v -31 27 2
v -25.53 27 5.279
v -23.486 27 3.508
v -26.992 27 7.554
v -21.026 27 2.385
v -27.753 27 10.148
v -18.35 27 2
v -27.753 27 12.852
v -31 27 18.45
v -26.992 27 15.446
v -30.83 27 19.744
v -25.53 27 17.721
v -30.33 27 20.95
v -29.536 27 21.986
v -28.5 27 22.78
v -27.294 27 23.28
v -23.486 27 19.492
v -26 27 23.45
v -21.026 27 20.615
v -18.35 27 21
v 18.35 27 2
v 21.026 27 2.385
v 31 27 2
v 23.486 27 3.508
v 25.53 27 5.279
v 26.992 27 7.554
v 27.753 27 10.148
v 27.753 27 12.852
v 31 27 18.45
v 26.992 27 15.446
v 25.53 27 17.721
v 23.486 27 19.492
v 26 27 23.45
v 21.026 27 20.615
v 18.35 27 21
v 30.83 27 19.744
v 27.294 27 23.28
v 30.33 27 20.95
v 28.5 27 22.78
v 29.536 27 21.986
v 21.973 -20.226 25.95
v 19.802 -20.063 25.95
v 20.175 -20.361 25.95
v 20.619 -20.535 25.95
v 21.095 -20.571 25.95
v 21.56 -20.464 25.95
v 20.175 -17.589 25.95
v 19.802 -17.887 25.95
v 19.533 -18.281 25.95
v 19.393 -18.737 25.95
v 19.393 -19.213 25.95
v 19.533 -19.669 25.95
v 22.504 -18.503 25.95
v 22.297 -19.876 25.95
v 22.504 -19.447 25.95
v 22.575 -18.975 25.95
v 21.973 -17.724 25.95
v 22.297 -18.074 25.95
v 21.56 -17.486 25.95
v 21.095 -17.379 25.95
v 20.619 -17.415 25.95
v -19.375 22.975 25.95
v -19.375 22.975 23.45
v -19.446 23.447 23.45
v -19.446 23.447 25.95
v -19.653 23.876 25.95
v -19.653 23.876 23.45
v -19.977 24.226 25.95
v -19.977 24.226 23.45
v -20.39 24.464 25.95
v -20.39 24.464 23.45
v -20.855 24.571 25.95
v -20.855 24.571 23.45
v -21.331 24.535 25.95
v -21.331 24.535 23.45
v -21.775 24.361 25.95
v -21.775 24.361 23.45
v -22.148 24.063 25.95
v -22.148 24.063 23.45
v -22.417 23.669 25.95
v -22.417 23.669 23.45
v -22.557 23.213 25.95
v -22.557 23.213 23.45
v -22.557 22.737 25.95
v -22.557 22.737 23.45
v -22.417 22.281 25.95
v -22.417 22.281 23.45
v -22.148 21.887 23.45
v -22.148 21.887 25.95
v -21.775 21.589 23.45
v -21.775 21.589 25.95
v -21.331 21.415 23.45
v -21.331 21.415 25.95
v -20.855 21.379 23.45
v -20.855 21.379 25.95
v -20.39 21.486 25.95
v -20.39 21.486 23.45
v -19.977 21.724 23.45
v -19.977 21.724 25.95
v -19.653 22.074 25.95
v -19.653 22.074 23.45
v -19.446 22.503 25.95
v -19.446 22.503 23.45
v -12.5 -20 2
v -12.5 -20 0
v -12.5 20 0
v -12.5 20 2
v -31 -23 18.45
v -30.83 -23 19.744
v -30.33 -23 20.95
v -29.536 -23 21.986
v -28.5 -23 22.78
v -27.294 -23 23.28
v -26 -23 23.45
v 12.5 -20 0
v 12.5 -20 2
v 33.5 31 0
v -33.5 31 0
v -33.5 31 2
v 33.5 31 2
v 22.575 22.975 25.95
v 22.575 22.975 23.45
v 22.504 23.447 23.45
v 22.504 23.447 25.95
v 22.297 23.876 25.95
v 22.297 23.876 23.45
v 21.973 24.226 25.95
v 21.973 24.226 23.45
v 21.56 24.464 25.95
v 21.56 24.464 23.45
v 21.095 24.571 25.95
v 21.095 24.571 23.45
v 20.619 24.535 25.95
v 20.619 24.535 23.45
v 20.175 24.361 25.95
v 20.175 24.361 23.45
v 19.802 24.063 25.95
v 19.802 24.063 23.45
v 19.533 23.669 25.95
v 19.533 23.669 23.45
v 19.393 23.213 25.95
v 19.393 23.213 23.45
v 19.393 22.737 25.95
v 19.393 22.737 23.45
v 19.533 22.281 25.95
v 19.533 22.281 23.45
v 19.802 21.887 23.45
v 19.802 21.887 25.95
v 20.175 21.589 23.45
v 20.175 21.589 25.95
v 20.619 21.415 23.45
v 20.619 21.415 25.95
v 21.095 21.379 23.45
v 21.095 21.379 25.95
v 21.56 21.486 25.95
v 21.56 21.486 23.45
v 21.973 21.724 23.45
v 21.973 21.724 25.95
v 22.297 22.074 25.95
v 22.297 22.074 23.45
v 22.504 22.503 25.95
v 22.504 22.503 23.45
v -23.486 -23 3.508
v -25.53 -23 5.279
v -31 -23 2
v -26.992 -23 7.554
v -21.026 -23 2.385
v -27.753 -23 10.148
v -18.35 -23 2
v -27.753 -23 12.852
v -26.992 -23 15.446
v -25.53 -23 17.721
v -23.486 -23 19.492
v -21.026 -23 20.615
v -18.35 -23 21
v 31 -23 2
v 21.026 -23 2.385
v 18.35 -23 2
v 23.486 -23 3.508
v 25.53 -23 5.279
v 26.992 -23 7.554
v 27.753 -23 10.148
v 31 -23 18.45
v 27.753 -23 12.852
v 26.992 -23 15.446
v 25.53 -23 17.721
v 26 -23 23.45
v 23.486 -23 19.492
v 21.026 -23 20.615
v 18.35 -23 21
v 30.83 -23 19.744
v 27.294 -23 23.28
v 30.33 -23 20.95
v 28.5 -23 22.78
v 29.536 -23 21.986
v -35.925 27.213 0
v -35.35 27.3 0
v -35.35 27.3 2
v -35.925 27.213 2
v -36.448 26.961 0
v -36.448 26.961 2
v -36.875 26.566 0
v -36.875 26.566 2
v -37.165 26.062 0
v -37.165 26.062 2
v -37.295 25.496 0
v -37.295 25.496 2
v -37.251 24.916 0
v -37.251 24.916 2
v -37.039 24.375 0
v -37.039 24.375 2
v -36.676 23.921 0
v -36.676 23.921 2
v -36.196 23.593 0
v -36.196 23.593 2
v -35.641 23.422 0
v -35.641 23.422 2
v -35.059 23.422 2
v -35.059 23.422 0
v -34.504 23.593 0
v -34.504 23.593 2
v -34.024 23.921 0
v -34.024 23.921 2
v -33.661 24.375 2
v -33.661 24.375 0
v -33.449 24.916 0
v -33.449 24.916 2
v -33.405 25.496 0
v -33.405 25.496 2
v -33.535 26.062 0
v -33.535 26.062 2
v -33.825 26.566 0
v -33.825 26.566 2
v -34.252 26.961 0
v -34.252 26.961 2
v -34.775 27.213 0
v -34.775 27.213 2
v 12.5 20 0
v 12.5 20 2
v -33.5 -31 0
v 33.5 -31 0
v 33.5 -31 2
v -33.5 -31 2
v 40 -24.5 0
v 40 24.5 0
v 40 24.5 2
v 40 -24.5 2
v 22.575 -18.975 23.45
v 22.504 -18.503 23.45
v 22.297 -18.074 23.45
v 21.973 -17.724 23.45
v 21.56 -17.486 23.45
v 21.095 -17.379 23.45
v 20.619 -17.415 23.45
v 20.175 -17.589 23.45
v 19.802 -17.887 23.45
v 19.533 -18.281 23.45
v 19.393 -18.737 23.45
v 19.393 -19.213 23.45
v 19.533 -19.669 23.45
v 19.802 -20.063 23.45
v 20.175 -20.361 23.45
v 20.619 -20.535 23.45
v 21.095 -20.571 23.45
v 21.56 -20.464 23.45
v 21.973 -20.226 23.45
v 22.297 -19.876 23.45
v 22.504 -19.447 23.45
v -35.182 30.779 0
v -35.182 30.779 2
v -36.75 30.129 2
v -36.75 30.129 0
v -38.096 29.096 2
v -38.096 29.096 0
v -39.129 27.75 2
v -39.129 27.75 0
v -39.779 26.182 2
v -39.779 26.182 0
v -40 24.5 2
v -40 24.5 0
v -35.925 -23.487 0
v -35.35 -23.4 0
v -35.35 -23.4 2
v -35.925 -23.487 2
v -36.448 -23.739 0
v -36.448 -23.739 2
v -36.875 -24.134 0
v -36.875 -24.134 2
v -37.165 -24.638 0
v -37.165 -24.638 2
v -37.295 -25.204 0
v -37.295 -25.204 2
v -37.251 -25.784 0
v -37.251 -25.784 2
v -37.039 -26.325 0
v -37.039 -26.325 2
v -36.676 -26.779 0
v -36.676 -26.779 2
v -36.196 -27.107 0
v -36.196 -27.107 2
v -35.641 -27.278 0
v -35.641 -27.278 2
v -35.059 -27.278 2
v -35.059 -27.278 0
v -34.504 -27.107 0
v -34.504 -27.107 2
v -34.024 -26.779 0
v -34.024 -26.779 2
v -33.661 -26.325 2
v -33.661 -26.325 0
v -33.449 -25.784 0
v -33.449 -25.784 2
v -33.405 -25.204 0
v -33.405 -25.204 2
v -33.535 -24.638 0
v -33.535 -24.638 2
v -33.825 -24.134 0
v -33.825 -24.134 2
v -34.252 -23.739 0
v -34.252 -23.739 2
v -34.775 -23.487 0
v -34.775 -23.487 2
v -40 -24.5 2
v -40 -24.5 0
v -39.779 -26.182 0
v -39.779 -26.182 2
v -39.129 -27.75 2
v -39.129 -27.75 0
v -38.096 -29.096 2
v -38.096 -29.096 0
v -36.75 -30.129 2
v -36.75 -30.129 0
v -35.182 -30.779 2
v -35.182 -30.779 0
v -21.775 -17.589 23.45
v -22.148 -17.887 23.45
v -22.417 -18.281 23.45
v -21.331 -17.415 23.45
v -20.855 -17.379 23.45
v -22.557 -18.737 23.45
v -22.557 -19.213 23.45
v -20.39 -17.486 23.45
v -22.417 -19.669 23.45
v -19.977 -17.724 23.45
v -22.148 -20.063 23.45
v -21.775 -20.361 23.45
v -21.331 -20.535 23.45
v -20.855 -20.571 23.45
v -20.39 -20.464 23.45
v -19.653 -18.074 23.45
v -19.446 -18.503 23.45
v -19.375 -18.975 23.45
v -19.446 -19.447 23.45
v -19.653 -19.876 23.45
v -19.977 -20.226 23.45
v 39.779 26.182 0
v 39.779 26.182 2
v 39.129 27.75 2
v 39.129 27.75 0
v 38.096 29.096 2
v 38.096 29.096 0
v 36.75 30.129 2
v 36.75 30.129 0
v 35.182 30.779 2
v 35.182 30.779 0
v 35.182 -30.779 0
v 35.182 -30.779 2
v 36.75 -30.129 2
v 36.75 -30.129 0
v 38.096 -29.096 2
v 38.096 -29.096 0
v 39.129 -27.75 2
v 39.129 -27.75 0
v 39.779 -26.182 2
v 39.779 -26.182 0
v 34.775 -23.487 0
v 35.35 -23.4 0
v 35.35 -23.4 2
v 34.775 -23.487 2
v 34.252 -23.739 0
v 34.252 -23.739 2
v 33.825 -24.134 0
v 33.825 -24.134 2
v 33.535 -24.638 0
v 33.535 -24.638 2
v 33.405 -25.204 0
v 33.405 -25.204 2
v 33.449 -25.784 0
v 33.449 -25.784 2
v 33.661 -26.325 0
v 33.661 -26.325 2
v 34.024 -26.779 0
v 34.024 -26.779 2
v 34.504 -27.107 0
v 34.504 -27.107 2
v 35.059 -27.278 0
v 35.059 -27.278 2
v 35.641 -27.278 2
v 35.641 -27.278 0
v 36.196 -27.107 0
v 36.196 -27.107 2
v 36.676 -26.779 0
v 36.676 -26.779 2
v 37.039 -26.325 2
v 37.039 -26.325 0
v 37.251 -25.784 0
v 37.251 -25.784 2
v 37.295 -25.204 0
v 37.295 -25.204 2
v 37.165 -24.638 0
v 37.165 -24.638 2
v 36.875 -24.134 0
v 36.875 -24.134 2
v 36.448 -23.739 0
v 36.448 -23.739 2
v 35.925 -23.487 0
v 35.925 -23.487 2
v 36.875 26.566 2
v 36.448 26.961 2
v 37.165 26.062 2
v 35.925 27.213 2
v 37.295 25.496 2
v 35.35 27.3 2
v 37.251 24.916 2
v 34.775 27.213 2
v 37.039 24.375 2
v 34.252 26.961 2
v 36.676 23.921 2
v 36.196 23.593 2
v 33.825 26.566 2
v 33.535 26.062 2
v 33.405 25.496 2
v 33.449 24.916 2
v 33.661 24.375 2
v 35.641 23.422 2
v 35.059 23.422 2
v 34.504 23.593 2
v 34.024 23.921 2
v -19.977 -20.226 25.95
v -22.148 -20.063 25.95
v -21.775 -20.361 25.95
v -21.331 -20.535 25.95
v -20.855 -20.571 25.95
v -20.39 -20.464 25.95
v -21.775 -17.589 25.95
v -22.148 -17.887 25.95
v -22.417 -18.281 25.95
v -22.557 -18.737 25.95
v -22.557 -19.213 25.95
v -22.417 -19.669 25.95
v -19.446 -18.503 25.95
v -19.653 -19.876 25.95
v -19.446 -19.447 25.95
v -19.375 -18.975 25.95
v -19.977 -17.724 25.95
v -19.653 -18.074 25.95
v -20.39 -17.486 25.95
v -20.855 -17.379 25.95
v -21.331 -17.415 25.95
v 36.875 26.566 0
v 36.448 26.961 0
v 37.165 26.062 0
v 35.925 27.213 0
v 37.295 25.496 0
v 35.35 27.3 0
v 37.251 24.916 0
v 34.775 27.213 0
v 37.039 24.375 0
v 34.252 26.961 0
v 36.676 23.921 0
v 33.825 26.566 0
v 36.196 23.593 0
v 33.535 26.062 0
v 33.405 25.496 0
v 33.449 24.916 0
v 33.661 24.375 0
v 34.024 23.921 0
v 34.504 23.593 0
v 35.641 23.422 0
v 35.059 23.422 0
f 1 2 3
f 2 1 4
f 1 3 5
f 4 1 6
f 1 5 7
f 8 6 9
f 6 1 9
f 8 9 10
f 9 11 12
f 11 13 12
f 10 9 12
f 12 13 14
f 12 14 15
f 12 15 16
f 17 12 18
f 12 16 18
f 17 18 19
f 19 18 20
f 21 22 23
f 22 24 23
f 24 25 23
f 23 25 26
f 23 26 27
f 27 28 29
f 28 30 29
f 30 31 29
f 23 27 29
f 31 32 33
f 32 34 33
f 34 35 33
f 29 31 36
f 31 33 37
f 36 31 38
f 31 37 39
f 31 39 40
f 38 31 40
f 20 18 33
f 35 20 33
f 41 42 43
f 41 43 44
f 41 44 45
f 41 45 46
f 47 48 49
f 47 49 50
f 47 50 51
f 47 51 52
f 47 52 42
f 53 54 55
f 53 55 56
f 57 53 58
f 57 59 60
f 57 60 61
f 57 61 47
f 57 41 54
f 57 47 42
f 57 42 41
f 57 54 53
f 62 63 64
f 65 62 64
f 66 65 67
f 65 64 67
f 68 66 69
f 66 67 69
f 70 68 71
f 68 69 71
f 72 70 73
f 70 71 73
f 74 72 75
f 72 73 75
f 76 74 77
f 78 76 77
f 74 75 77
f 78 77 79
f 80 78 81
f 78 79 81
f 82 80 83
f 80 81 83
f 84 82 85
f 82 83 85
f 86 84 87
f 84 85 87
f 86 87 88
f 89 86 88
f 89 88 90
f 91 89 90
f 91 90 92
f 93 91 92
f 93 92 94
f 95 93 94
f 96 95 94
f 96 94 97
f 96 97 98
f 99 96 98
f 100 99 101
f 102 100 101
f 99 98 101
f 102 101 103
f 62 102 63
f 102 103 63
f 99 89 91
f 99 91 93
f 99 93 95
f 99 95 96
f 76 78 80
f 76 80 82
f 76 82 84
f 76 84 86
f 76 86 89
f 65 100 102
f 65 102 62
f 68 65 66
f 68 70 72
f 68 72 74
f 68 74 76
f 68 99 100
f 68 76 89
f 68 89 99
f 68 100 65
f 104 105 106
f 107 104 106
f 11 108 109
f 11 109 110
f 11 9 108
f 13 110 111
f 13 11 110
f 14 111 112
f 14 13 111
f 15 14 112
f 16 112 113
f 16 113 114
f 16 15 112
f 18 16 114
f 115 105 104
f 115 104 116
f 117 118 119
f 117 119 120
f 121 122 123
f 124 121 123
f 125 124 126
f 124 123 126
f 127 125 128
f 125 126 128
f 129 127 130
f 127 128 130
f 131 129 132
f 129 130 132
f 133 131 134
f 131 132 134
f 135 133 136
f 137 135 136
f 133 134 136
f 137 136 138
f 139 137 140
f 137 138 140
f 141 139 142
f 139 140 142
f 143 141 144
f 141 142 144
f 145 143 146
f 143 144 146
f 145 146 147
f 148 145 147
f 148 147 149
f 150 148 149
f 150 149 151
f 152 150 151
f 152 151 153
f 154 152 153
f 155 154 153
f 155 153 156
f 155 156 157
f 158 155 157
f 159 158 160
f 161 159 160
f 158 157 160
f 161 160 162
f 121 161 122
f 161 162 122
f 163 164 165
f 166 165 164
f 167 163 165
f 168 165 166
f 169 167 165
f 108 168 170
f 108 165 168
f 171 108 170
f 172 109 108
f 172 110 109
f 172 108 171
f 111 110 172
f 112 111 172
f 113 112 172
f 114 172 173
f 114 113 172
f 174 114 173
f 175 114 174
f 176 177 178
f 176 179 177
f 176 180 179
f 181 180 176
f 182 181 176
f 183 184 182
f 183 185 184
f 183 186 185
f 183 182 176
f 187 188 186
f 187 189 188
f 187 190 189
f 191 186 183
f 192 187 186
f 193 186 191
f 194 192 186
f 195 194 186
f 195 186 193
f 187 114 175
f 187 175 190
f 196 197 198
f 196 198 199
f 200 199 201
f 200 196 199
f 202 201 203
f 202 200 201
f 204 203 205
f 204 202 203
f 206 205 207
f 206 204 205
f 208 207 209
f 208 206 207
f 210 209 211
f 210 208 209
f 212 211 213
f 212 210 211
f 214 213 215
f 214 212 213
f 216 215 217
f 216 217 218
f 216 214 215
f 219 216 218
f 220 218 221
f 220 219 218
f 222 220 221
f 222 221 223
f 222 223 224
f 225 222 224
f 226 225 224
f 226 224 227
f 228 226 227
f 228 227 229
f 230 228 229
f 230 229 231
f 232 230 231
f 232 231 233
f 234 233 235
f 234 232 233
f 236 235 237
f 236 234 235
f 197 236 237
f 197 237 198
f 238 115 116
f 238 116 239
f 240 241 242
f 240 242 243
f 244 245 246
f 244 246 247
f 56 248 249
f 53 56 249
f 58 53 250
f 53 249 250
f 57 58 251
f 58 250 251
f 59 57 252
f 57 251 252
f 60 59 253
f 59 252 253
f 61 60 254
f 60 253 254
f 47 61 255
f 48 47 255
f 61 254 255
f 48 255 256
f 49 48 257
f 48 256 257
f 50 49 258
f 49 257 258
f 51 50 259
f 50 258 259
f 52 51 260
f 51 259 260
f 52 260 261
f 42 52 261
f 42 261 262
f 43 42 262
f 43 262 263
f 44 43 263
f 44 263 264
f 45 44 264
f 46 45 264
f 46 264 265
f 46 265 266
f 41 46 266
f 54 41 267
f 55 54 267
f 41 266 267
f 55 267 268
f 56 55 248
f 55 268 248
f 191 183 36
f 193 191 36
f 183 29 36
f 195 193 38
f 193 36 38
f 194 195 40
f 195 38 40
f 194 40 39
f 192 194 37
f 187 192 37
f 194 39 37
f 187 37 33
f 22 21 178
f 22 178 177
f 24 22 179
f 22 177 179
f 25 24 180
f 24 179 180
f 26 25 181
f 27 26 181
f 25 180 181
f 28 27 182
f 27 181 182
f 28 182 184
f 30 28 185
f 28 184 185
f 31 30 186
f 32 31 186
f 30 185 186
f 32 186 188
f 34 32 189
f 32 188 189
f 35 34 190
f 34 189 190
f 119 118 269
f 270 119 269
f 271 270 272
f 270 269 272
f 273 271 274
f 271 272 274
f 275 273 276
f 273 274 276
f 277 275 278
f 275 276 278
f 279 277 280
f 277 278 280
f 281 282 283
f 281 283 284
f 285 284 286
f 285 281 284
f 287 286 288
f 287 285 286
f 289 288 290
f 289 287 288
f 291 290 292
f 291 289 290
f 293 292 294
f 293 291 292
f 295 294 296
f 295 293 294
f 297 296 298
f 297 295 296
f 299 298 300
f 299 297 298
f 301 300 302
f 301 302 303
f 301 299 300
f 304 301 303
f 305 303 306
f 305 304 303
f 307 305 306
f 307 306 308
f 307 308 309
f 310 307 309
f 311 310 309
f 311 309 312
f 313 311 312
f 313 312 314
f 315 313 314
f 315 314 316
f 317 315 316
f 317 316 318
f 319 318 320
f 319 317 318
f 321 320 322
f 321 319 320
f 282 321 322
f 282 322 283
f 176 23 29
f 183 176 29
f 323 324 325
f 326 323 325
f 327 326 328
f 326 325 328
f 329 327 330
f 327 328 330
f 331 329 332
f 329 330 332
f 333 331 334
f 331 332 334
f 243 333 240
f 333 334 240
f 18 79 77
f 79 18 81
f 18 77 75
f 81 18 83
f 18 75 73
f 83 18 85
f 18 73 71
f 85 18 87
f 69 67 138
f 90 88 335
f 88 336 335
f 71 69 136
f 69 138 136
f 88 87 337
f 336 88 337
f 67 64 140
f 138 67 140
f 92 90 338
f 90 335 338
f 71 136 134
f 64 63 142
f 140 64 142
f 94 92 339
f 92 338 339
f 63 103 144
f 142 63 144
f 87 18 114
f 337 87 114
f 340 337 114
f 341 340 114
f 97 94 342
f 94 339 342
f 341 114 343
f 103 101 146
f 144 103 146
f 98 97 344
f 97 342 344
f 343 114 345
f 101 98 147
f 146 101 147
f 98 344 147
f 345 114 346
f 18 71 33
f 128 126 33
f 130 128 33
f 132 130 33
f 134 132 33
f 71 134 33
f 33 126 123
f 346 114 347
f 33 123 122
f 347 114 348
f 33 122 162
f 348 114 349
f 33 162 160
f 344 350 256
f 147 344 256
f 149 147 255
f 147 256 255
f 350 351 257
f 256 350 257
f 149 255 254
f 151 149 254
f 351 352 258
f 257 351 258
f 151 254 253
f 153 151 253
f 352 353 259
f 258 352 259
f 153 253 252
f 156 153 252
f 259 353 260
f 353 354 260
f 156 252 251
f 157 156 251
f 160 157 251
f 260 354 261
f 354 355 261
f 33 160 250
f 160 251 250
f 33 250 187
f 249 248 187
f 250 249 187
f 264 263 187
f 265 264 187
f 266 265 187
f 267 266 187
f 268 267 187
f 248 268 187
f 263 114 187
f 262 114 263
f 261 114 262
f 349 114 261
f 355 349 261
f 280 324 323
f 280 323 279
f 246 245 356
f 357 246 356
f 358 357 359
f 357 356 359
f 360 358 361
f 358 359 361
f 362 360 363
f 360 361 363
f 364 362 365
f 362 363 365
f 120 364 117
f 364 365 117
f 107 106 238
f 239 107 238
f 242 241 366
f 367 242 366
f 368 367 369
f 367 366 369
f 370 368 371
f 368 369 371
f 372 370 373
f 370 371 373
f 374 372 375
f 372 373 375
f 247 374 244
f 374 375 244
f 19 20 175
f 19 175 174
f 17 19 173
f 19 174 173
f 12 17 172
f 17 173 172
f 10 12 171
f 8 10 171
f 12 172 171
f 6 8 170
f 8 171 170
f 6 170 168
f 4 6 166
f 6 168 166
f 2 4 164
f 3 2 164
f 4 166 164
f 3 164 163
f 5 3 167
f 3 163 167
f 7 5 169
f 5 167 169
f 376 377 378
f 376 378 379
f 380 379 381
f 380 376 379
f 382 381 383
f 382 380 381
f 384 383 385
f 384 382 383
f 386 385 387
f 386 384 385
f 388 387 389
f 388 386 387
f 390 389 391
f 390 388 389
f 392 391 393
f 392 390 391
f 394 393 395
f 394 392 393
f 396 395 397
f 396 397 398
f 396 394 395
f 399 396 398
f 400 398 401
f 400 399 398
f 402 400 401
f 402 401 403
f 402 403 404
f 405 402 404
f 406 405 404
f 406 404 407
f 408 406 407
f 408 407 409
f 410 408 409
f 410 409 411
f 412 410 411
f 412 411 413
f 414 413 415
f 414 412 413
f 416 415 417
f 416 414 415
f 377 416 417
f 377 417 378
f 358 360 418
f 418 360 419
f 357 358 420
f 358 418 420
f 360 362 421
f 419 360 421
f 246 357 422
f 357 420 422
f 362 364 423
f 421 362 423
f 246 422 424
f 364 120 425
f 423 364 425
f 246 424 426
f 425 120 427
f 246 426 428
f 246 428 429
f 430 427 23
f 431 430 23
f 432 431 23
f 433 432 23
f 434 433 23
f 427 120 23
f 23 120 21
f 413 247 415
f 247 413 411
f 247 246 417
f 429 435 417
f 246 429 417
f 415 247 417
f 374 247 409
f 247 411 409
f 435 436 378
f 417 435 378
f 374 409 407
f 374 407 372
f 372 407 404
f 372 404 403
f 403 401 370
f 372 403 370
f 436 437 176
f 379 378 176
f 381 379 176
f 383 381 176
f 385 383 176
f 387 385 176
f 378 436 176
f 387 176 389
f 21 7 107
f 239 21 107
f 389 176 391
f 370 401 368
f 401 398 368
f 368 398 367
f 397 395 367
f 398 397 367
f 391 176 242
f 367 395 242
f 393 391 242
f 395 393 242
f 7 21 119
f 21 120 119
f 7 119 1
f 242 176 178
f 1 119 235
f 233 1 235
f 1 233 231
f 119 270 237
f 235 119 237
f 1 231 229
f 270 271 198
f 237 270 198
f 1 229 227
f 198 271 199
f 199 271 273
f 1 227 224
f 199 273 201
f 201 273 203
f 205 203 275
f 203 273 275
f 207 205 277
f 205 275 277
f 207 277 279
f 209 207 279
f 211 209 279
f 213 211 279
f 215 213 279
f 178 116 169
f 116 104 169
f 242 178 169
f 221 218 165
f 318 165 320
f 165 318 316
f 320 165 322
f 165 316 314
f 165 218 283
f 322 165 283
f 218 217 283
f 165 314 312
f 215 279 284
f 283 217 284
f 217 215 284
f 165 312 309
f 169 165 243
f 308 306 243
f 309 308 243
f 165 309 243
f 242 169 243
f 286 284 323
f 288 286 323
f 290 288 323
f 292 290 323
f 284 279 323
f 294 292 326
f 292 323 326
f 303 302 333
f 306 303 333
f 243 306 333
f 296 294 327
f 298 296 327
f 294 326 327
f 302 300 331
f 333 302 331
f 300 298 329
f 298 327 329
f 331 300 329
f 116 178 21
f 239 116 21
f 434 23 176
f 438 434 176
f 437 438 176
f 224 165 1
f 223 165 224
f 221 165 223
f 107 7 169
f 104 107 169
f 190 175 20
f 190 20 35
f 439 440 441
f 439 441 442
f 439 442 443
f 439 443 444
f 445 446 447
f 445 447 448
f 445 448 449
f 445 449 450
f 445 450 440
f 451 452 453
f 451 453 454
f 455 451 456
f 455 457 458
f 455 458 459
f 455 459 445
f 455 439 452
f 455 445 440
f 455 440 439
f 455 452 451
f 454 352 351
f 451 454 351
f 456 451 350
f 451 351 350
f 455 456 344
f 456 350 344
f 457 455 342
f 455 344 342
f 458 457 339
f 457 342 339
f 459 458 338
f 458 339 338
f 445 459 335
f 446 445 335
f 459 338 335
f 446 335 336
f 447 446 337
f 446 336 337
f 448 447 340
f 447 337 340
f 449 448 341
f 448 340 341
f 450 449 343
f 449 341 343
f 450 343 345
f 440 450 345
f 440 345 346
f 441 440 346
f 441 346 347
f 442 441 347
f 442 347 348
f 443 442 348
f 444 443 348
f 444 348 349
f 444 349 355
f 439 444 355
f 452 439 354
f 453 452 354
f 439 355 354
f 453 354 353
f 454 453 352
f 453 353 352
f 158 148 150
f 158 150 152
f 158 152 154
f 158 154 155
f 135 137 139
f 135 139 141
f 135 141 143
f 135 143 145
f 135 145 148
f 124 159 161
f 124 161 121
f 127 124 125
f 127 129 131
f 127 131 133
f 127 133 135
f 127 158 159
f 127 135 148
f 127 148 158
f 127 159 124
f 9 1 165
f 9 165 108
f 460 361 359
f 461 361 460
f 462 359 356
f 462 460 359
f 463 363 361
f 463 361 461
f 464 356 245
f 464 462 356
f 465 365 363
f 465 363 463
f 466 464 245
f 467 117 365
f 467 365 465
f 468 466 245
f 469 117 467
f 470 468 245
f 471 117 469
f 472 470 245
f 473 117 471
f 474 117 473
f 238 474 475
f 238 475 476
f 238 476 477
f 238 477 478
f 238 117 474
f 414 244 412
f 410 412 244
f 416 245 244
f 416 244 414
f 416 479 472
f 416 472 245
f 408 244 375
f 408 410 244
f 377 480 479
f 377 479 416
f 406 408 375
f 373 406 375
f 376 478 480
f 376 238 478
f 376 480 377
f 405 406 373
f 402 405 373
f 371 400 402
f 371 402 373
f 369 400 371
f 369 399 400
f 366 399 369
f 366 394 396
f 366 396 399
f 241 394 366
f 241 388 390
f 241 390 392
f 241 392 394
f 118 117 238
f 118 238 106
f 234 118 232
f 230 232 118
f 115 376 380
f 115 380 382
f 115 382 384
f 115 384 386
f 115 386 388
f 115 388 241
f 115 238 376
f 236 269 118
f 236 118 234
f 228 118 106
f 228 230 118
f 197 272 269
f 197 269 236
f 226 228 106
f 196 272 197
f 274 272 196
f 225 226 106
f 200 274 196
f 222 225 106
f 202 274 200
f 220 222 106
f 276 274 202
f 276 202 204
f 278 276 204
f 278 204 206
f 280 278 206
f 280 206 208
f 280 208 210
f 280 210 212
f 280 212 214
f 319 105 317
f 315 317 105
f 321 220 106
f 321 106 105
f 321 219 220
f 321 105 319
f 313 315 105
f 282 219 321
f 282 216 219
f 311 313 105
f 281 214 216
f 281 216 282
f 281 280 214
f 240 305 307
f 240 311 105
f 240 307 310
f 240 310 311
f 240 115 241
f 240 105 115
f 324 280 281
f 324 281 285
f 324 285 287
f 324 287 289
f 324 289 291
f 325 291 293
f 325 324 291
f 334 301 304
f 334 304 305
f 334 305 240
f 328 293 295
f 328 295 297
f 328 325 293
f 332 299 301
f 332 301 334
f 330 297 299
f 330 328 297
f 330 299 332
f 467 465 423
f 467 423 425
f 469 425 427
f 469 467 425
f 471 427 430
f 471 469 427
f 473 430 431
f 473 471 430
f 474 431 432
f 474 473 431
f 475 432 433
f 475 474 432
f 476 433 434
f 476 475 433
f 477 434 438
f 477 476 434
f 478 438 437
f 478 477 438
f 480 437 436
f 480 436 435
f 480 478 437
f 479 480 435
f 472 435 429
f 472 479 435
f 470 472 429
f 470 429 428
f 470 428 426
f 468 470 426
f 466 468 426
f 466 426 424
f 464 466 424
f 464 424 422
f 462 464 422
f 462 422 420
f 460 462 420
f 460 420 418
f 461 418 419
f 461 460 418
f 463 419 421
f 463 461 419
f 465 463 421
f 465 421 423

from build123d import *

# Parameters (mm, degrees)
PAD_DEPTH    = 33
SKETCH002_W  = 62
SKETCH002_H  = 21.45
PAD002_DEPTH = 25
FILLET_R     = 5
SKETCH003_R  = 1.6
PAD003_DEPTH = 2.5
SKETCH001_R  = 1.95
PAD001_DEPTH = 2
SKETCH004_W  = 40
SKETCH004_H  = 25
POCKET_DEPTH = 5


with BuildPart() as pad:
    # Sketch → Pad (new body, symmetric)
    with BuildSketch(Plane(origin=(0, 0, 2), x_dir=(1, 0, 0), z_dir=(0, -1, 0))):
        with BuildLine():
            ThreePointArc((-18.35, 19), (-27.85, 9.5), (-18.35, 0))
            Line((-18.35, 0), (18.35, 0))
            ThreePointArc((18.35, 0), (27.85, 9.5), (18.35, 19))
            Line((-18.35, 19), (18.35, 19))
        make_face()
    extrude(amount=PAD_DEPTH, both=True)


with BuildPart() as pad003:
    # Sketch002 → Pad002 (new body, symmetric)
    with BuildSketch(Plane.XZ.offset(-2)):
        with Locations((0, 12.725)):
            Rectangle(SKETCH002_W, SKETCH002_H)
    extrude(amount=PAD002_DEPTH, both=True)

    # Fillet
    fillet_edges = [pad003.edges().sort_by_distance(p)[0] for p in [
        (-31, 2, 23.45),
        (31, 2, 23.45),
    ]]
    fillet(fillet_edges, radius=FILLET_R)

    # Cut: cut Pad
    add(pad.part, mode=Mode.SUBTRACT)

    # Sketch003 → Pad003 (new body)
    with BuildSketch(Plane.XY.offset(23.45)):
        with Locations((-20.975, 22.975)):
            Circle(SKETCH003_R)
        with Locations((-20.975, -18.975)):
            Circle(SKETCH003_R)
        with Locations((20.975, 22.975)):
            Circle(SKETCH003_R)
        with Locations((20.975, -18.975)):
            Circle(SKETCH003_R)
    extrude(amount=PAD003_DEPTH)


with BuildPart() as fusion:
    # Sketch001 → Pad001 (new body)
    with BuildSketch(Plane(origin=(0, 0, 0), x_dir=(0, 1, 0), z_dir=(0, 0, 1))):
        with BuildLine():
            Line((-24.5, 40), (24.5, 40))
            ThreePointArc((31, 33.5), (29.096194, 38.096194), (24.5, 40))
            Line((31, 33.5), (31, -33.5))
            ThreePointArc((24.5, -40), (29.096194, -38.096194), (31, -33.5))
            Line((24.5, -40), (-24.5, -40))
            ThreePointArc((-31, -33.5), (-29.096194, -38.096194), (-24.5, -40))
            Line((-31, -33.5), (-31, 33.5))
            ThreePointArc((-24.5, 40), (-29.096194, 38.096194), (-31, 33.5))
        make_face()
        with Locations((-25.35, 35.35)):
            Circle(SKETCH001_R, mode=Mode.SUBTRACT)
        with Locations((25.35, 35.35)):
            Circle(SKETCH001_R, mode=Mode.SUBTRACT)
        with Locations((25.35, -35.35)):
            Circle(SKETCH001_R, mode=Mode.SUBTRACT)
        with Locations((-25.35, -35.35)):
            Circle(SKETCH001_R, mode=Mode.SUBTRACT)
    extrude(amount=PAD001_DEPTH)

    # Sketch004 → Pocket (cut)
    with BuildSketch(Plane.YX):
        Rectangle(SKETCH004_W, SKETCH004_H)
    extrude(amount=-POCKET_DEPTH, mode=Mode.SUBTRACT)

    # Fusion: union Pad003
    add(pad003.part)


solid = fusion.part
